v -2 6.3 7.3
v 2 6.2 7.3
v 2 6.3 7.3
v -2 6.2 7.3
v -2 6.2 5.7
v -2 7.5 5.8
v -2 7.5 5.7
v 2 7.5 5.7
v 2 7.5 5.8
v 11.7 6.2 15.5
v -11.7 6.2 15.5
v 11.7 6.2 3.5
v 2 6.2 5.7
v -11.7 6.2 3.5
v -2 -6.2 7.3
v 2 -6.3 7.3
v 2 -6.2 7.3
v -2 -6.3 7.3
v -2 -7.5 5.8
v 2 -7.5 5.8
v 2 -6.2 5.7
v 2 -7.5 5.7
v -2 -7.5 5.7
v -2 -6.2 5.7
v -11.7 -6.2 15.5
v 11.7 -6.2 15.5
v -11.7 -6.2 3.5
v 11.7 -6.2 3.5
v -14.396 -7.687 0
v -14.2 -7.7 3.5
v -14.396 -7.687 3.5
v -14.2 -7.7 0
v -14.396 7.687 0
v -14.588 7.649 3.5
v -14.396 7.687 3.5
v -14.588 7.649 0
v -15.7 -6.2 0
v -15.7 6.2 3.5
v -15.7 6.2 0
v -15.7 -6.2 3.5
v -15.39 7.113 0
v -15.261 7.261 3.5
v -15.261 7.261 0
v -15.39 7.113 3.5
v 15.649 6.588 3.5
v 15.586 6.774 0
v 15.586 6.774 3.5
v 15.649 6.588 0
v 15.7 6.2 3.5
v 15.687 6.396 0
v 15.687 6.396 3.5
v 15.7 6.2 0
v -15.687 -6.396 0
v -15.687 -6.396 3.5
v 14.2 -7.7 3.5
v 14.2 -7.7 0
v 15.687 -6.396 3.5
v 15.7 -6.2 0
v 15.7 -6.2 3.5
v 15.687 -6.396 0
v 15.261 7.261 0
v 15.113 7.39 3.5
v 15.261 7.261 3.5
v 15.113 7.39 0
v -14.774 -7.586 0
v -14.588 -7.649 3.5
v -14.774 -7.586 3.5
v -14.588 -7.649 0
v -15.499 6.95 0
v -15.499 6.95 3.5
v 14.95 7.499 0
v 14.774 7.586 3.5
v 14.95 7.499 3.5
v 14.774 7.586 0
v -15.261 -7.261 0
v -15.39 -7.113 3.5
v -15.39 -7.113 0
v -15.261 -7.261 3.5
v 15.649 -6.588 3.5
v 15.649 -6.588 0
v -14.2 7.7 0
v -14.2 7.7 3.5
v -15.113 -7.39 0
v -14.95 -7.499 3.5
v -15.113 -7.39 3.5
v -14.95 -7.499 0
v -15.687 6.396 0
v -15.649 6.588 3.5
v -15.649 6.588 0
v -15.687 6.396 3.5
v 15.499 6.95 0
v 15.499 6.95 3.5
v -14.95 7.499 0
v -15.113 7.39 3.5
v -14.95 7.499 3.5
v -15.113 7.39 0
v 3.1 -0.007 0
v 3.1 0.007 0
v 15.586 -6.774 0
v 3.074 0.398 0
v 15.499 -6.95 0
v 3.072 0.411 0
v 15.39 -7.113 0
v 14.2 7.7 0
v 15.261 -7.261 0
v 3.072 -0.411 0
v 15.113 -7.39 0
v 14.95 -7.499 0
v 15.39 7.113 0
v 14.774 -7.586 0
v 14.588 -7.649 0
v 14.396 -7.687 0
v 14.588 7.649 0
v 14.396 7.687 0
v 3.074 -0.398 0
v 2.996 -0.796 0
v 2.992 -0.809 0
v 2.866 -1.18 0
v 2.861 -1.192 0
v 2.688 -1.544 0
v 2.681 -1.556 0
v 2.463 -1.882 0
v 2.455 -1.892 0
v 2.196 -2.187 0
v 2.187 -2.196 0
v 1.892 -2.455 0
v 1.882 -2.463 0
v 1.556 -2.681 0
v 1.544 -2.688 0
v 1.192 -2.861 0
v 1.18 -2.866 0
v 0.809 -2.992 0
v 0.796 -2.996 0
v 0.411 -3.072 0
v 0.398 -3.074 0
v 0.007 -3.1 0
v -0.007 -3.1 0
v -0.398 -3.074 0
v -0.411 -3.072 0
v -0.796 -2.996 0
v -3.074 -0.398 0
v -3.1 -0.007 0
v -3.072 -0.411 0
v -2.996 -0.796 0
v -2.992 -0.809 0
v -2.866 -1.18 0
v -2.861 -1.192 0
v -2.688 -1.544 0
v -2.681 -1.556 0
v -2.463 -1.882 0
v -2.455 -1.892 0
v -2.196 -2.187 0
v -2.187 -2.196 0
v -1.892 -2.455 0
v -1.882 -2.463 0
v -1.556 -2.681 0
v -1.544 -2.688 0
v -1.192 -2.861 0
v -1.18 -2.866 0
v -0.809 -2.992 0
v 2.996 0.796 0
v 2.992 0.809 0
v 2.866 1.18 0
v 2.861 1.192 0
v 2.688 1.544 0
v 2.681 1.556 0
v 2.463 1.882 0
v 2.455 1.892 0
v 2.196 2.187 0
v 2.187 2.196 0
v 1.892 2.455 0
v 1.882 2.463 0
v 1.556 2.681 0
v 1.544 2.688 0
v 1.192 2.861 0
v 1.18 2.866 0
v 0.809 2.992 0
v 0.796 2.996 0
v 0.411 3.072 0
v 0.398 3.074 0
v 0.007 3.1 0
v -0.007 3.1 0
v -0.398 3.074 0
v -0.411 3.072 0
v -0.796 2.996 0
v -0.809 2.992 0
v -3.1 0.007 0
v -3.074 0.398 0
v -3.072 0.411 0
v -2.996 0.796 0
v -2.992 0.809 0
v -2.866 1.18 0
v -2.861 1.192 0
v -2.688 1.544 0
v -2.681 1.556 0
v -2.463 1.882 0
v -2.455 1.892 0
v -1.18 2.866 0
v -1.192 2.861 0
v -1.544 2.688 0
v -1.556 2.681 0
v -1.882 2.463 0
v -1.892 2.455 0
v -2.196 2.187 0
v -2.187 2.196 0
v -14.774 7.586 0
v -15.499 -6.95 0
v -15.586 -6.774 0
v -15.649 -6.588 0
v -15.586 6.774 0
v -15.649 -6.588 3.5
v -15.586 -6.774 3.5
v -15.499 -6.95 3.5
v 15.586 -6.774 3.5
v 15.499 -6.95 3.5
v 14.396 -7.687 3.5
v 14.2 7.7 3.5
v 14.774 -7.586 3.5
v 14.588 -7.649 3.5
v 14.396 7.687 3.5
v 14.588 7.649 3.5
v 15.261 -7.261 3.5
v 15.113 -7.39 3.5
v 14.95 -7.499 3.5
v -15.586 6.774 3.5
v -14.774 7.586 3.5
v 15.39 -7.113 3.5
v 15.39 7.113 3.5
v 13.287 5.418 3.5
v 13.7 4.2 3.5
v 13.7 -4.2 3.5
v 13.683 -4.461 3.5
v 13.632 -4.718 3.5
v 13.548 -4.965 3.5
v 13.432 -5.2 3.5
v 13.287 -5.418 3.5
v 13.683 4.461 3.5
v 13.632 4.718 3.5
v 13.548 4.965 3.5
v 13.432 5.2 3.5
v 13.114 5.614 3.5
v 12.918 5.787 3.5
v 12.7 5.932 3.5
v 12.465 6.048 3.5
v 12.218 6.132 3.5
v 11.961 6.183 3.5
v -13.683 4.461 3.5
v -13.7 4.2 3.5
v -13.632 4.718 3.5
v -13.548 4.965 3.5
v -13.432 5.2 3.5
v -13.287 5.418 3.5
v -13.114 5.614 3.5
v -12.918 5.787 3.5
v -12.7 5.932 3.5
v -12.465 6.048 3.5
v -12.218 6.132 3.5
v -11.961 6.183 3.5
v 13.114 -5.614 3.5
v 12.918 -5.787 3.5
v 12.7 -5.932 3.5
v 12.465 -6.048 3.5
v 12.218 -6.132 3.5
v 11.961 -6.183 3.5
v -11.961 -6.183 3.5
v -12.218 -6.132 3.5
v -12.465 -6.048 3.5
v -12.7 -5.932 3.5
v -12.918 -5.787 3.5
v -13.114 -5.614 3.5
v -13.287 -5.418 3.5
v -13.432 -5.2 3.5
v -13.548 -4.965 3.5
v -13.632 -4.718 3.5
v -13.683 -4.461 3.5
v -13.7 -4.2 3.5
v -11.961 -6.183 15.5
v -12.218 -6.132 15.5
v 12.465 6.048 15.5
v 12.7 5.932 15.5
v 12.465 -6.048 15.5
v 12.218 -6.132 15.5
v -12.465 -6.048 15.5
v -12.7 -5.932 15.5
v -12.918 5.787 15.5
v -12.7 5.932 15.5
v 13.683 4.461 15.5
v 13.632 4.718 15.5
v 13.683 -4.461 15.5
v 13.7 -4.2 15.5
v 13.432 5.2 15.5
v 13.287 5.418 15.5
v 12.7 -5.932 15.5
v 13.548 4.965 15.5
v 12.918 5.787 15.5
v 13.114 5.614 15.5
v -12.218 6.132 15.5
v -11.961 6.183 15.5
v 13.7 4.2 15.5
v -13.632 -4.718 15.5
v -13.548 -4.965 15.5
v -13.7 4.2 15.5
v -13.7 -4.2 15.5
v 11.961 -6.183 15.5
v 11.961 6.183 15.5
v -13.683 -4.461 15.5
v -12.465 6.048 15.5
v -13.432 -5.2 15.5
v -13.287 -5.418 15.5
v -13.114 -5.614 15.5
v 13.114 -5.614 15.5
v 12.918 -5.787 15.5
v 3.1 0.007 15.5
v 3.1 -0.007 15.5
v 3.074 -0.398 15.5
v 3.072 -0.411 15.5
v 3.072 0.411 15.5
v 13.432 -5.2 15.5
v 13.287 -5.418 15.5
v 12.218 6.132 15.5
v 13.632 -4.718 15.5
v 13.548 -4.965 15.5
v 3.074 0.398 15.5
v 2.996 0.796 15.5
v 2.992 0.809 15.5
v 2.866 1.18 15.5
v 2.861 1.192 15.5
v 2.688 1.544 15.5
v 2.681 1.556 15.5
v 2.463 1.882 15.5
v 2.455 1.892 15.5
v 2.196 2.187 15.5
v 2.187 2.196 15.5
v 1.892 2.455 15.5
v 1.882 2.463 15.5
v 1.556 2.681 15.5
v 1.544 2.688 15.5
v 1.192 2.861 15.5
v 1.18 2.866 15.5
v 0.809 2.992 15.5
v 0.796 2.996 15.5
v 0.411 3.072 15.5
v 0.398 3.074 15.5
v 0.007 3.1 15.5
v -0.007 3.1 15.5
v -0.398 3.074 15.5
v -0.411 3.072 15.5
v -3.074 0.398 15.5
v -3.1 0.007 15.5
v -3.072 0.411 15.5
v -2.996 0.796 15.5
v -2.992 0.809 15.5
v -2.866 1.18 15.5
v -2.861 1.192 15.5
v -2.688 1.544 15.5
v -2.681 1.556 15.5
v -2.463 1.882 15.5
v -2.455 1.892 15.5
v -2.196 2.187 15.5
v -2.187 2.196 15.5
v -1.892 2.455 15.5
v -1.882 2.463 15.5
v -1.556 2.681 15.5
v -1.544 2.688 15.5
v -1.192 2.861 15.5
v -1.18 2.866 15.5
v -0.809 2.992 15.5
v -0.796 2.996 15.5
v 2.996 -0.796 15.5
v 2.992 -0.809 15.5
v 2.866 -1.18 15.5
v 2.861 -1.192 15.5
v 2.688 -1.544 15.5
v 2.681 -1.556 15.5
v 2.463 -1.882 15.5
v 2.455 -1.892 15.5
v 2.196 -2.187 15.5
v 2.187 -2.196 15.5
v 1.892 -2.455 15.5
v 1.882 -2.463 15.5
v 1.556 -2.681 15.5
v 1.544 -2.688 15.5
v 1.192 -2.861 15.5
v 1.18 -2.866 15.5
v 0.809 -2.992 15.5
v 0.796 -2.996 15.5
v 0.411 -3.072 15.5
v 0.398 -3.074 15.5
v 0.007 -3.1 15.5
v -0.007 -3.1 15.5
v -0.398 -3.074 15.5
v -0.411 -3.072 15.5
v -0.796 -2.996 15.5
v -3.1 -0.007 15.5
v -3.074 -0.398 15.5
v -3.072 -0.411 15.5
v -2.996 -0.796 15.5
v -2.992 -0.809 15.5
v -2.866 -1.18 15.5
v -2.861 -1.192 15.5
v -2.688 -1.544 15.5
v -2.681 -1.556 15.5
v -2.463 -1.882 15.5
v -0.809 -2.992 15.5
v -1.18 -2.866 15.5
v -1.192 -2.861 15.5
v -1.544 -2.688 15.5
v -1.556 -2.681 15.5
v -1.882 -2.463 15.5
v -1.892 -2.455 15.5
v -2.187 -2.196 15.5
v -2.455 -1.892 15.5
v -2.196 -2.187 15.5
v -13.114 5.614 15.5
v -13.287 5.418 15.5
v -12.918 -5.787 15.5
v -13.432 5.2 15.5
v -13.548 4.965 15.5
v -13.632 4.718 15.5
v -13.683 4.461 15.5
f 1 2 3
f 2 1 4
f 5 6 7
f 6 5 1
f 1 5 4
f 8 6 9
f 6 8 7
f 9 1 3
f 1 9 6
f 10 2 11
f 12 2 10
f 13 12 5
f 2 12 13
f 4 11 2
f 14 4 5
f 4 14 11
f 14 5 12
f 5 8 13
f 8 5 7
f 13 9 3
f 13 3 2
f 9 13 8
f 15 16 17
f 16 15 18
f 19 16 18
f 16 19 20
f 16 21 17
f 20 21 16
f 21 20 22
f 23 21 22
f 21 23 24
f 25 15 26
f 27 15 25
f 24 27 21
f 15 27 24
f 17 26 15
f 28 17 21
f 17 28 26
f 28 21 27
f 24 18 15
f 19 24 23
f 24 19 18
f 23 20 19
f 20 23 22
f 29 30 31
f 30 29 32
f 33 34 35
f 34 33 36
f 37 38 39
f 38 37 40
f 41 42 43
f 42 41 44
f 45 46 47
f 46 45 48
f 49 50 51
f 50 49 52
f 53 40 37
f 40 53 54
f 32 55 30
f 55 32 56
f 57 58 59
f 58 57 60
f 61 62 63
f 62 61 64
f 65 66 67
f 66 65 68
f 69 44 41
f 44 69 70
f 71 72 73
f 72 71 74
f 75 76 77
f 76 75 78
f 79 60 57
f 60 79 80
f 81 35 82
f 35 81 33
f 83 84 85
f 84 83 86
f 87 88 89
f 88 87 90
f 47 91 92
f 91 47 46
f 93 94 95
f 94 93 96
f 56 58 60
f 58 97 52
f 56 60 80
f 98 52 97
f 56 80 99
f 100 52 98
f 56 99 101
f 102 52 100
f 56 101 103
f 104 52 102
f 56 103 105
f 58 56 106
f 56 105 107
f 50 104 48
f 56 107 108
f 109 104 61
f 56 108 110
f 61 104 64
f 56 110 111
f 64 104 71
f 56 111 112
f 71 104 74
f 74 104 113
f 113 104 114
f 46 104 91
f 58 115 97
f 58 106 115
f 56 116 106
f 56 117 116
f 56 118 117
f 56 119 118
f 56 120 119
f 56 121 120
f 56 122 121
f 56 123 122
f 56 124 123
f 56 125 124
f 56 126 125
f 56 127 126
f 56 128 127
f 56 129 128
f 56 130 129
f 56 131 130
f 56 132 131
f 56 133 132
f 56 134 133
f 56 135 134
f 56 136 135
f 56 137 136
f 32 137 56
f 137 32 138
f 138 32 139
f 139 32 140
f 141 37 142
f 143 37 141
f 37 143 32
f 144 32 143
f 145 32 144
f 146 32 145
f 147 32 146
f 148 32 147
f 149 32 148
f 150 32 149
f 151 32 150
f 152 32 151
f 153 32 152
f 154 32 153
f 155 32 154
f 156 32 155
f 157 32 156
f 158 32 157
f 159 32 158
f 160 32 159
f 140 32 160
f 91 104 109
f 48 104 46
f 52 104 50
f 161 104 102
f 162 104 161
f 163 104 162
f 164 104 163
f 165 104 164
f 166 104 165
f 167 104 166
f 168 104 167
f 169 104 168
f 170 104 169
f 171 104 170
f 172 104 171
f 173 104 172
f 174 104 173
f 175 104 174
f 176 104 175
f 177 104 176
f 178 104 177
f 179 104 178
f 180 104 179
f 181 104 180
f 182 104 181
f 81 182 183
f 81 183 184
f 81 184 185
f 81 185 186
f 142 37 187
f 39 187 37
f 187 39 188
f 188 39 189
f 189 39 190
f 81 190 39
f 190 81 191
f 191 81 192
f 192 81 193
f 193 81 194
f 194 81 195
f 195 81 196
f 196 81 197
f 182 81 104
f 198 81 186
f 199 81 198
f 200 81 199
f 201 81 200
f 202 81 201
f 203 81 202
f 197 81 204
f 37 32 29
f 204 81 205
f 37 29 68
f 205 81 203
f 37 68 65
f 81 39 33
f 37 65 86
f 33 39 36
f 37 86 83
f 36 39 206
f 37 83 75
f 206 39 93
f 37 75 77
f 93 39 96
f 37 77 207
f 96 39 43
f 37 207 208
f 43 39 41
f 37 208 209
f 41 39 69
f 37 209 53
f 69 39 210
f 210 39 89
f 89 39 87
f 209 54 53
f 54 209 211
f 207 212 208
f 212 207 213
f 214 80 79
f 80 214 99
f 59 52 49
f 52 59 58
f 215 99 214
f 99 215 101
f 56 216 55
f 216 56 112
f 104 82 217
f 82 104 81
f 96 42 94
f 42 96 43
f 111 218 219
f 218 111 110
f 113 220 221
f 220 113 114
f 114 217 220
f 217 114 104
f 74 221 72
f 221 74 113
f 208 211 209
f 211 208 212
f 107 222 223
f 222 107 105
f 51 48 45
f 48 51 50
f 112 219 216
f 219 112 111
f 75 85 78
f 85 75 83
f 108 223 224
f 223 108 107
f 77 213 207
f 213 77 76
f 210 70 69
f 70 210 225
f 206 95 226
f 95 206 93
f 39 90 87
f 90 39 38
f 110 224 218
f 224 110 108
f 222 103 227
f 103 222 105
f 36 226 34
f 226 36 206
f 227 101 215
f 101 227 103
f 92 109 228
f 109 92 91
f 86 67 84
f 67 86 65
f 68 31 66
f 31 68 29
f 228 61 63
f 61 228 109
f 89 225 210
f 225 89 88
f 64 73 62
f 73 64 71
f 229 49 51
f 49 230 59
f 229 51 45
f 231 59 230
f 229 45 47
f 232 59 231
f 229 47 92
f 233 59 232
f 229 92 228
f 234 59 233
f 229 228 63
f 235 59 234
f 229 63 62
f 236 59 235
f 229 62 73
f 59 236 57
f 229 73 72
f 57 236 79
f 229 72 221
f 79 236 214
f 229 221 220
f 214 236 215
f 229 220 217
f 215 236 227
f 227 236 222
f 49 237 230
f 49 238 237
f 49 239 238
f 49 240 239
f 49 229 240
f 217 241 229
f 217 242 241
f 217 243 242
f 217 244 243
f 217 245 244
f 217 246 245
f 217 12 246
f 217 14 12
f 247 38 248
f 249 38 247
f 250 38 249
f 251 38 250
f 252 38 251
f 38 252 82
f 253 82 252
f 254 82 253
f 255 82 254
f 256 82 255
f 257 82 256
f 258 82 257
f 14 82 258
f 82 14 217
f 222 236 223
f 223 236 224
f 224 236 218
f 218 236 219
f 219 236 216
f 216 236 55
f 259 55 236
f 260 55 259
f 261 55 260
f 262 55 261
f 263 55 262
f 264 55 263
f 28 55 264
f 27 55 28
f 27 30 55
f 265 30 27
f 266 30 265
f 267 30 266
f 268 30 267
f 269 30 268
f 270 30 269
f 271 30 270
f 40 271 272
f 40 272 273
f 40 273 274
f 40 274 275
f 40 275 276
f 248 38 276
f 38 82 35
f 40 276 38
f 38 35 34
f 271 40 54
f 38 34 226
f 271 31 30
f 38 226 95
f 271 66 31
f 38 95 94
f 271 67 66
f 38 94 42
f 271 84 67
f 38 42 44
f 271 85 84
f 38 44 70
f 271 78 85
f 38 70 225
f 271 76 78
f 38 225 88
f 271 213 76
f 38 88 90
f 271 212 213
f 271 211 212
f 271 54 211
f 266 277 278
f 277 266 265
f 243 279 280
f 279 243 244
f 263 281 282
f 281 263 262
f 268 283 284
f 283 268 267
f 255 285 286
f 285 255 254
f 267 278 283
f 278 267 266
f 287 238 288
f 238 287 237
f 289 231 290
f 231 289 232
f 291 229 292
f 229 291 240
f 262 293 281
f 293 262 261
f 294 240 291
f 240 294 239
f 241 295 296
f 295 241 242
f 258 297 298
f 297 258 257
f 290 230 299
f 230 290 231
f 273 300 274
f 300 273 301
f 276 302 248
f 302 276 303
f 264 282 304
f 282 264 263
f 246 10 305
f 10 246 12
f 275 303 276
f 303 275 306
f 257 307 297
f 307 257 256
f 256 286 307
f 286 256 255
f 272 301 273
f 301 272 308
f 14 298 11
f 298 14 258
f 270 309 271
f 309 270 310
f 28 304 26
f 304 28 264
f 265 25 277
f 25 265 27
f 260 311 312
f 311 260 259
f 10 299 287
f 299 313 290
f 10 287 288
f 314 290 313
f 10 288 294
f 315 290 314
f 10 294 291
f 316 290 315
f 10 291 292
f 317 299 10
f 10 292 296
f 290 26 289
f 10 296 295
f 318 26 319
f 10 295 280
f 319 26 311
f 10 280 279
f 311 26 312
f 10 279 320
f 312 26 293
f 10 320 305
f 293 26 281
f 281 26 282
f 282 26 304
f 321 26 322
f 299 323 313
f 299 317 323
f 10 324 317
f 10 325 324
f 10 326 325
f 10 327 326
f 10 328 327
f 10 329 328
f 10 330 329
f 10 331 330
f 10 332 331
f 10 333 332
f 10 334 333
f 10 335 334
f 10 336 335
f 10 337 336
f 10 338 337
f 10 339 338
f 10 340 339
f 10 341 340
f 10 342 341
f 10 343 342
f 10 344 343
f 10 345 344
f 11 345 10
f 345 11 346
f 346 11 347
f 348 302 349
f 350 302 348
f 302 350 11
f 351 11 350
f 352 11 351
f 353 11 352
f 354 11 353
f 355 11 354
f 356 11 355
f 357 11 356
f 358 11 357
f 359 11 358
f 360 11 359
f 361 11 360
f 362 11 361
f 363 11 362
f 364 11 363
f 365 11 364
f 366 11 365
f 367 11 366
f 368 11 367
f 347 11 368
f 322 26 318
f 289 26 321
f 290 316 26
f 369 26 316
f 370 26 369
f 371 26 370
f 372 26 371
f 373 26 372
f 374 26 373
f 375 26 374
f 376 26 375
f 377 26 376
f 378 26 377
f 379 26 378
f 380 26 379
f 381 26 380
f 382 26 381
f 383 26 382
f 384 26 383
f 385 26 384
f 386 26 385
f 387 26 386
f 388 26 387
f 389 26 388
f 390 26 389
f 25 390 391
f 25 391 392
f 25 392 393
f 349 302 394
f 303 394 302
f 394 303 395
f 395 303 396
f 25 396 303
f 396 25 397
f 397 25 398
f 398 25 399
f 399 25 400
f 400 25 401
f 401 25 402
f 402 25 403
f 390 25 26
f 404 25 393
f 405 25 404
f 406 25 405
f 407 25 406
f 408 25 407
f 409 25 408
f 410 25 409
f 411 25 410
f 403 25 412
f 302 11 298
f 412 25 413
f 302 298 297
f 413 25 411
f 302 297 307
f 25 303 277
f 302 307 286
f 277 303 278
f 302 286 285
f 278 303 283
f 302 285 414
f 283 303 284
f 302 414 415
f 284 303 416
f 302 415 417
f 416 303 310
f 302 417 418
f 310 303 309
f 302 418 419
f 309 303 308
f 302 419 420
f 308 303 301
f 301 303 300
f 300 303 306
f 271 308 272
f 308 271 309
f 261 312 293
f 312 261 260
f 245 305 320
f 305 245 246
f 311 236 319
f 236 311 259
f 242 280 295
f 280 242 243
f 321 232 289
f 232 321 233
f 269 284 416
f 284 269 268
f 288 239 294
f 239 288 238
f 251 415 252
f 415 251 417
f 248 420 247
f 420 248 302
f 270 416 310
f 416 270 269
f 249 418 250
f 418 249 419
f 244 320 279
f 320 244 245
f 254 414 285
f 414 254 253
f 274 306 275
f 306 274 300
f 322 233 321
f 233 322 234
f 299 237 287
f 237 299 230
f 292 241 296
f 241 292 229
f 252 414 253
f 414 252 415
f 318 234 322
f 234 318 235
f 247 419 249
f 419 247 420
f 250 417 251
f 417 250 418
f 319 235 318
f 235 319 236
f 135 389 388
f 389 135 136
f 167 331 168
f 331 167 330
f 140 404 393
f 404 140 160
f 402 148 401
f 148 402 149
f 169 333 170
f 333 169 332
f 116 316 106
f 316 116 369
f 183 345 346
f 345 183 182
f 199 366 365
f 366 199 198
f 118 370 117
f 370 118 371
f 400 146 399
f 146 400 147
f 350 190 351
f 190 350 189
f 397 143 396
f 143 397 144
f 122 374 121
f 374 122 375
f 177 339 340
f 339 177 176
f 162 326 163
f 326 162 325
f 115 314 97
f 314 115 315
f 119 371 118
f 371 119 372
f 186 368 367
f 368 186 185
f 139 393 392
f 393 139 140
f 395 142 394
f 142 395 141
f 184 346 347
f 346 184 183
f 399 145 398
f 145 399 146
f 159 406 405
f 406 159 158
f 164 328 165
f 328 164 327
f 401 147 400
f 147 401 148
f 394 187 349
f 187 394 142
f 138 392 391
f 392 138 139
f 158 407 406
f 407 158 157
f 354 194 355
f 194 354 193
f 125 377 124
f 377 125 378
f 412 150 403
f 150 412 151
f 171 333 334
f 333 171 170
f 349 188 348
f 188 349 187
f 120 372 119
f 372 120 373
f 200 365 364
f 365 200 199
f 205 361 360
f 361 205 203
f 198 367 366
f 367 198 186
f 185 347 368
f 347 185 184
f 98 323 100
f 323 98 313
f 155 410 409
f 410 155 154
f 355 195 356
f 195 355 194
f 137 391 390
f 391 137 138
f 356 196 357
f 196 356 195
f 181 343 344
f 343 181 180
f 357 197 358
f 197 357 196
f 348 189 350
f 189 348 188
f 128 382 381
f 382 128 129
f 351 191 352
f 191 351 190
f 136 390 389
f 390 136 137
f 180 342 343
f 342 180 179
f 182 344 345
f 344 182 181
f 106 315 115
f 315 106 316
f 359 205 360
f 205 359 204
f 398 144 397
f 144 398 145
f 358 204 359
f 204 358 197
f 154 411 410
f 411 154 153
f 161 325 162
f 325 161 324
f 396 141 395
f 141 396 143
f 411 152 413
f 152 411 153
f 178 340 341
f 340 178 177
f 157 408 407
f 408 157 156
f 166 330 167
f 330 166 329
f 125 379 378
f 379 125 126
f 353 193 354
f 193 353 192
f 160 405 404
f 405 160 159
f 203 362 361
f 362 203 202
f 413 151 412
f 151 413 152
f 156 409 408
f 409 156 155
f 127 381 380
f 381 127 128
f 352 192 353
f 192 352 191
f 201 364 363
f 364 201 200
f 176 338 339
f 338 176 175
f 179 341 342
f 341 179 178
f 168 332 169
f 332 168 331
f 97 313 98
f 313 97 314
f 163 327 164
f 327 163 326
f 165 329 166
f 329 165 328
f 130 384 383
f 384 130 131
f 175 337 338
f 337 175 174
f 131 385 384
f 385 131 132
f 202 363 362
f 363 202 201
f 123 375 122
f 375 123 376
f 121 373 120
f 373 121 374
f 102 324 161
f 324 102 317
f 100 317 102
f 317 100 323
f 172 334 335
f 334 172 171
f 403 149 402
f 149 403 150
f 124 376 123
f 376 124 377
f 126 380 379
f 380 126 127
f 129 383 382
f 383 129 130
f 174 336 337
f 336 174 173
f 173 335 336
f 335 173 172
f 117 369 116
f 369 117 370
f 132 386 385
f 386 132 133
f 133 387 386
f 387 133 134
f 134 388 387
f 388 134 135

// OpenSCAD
// file: parameters.scad
// ============================================
// MODULAR CABLE ORGANIZER - SHARED PARAMETERS
// ============================================
// All dimensions in mm - include this in all files
// ============================================

$fn = 48;

// === TOLERANCES ===
clearance = 0.3;
port_clearance = 0.1;  // Extra clearance for port openings (reduced - 0.2 was too loose for USB-C)
wall = 1.6;

// === SLOT DIMENSIONS (2:1 aspect ratio) - scaled to 2/3 ===
slot_width = 32;  // Reduced by 1mm for more compact insert
slot_height = 16;  // Reduced by 1mm for more compact insert
slot_depth = 4;  // Reduced from 6mm - less frame depth needed

// === FRAME STRUCTURE ===
frame_wall = 0.5;   // Reduced for more compact frame
frame_border = 8;  // Increased by 10mm for mounting holes with countersink
frame_back = 2;     // Slightly thicker for snap catch strength
mount_hole_dia = 3;
countersink_dia = 6;  // Diameter of countersink for screw heads
countersink_depth = 2;  // Depth of countersink

// === GRID ===
grid_cols = 2;
grid_rows = 2;

// === INSERT BASE DIMENSIONS ===
insert_width = slot_width - (2 * clearance);
insert_height = slot_height - (2 * clearance);
insert_base_depth = slot_depth - 0.5;

// === INSERT BODY (protrudes from frame) ===
insert_body_width = insert_width - 4;
insert_body_height = insert_height - 3;
insert_body_depth = 12;  // Deep enough to accommodate male cable connectors
insert_top_thick = 1.5;  // Top platform thickness

// === SNAP TABS (on neck/body - catch on back plate) ===
snap_tab_width = 4;
snap_tab_protrude = 1.2;  // How far tab sticks out from body
snap_tab_thick = 1.5;     // Z thickness of tab
snap_tab_offset = 2.2;      // Distance from base to tab bottom on insert (increased to clear frame)

// === CONNECTOR PORT DIMENSIONS & BODY DEPTHS ===
// Port dimensions from reference blueprints
// Body depths sized to match typical male connector lengths

// USB-C: 8.4 x 2.6mm, male connector ~9mm
usbc_w = 8.4;
usbc_h = 2.6;
usbc_r = 1.0;
usbc_body_depth = 9;

// USB-A: 14.0 x 6.5mm, male connector ~13mm
usba_w = 14.0;
usba_h = 6.5;
usba_r = 0.5;
usba_body_depth = 13;

// USB Mini: 6.9 x 3.0mm, male connector ~9mm
usb_mini_w = 6.9;
usb_mini_h = 3.0;
usb_mini_r = 0.5;
usb_mini_body_depth = 9;

// USB Micro: 6.9 x 1.8mm, male connector ~7mm
usb_micro_w = 6.9;
usb_micro_h = 1.8;
usb_micro_r = 0.3;
usb_micro_body_depth = 7;

// USB-B: 8.0 x 7.5mm, male connector ~14mm
usb_b_w = 8.0;
usb_b_h = 7.5;
usb_b_r = 1.0;
usb_b_body_depth = 14;

// Lightning: 6.7 x 1.5mm, male connector ~8mm
lightning_w = 6.7;
lightning_h = 1.5;
lightning_r = 0.5;
lightning_body_depth = 8;

// HDMI: 14.0 x 4.5mm, male connector ~16mm
hdmi_w = 14.0;
hdmi_h = 4.5;
hdmi_r = 0.5;
hdmi_body_depth = 16;

// 3.5mm Audio Jack: male plug ~14mm
audio_jack_dia = 6.0;
audio_jack_body_depth = 14;

// Blank/Label: recessed area for label
label_w = 30;
label_h = 12;
label_depth = 0.8;

// === CALCULATED VALUES ===
frame_total_depth = frame_back + slot_depth;
grid_width = (grid_cols * slot_width) + ((grid_cols - 1) * frame_wall);
grid_height = (grid_rows * slot_height) + ((grid_rows - 1) * frame_wall);
frame_width = grid_width + (2 * frame_border);
frame_height_total = grid_height + (2 * frame_border);
insert_total_depth = insert_base_depth + insert_body_depth;
// file: insert_base.scad
// ============================================
// MODULAR CABLE ORGANIZER - BASE INSERT MODULE
// ============================================
// This is the parent module for all insert types
// Include this file and call insert_with_port() with a port shape
// ============================================

include <parameters.scad>

// === BASE INSERT WITH CUSTOM BODY DEPTH ===
module insert_blank_custom(body_depth) {
    union() {
        // Base plate (sits in frame slot)
        rounded_box_rect(insert_width, insert_height, insert_base_depth, 1.5);
        
        // Body (protrudes out front) - custom depth
        translate([0, 0, insert_base_depth])
            rounded_box_rect(insert_body_width, insert_body_height, body_depth, 2);
        
        // Snap tabs on all 4 sides
        snap_tabs_all();
    }
}

// === BASE INSERT (default depth - for backwards compatibility) ===
module insert_blank() {
    insert_blank_custom(insert_body_depth);
}

// === INSERT WITH THROUGH-HOLE PORT (custom depth) ===
// Pass body_depth and a 2D shape as children
module insert_with_port_custom(body_depth) {
    total_depth = insert_base_depth + body_depth;
    difference() {
        insert_blank_custom(body_depth);
        
        // Cut port hole ALL THE WAY through (tube shape)
        translate([0, 0, -0.1])
            linear_extrude(total_depth + 0.2)
            offset(r=port_clearance)  // Add clearance to port opening
            children();
    }
}

// === INSERT WITH THROUGH-HOLE PORT (default depth) ===
module insert_with_port() {
    insert_with_port_custom(insert_body_depth) children();
}

// === PRE-MADE INSERT MODULES WITH CORRECT DEPTHS ===
module insert_usbc() {
    insert_with_port_custom(usbc_body_depth) port_usbc();
}

module insert_usba() {
    insert_with_port_custom(usba_body_depth) port_usba();
}

module insert_usb_mini() {
    insert_with_port_custom(usb_mini_body_depth) port_usb_mini();
}

module insert_usb_micro() {
    insert_with_port_custom(usb_micro_body_depth) port_usb_micro();
}

module insert_usb_b() {
    insert_with_port_custom(usb_b_body_depth) port_usb_b();
}

module insert_lightning() {
    insert_with_port_custom(lightning_body_depth) port_lightning();
}

module insert_hdmi() {
    insert_with_port_custom(hdmi_body_depth) port_hdmi();
}

module insert_audio_jack() {
    insert_with_port_custom(audio_jack_body_depth) port_audio_jack();
}

// === SNAP TABS (on neck/body - catch on frame cutouts) ===
// Tabs are on the body, positioned to engage with frame wall cutouts
module snap_tabs_all() {
    // Position tabs up on body (clear of base/frame)
    tab_z = insert_base_depth + snap_tab_offset;
    
    // Tabs on all 4 sides of the body
    for (angle = [0, 90, 180, 270]) {
        rotate([0, 0, angle])
            translate([0, insert_body_height/2, tab_z])
            neck_snap_tab();
    }
}

module neck_snap_tab() {
    // Wedge shape (FLIPPED): 
    // - Peak/taper on BOTTOM - slides past back plate when inserting
    // - Flat on TOP - catches and holds
    hull() {
        // Peak of wedge (protruding, at BOTTOM of tab)
        translate([-snap_tab_width/2, snap_tab_protrude, 0])
            cube([snap_tab_width, 0.1, 0.1]);
        // Flat top (at body surface, TOP of tab)
        translate([-snap_tab_width/2, 0, snap_tab_thick])
            cube([snap_tab_width, 0.1, 0.1]);
        // Base of wedge (at body surface, bottom)
        translate([-snap_tab_width/2, 0, 0])
            cube([snap_tab_width, 0.1, 0.1]);
    }
}

module snap_tab_horizontal() {
    hull() {
        translate([0, -snap_tab_protrude/2, 0])
            cube([snap_tab_width, 0.1, snap_tab_thick], center=true);
        translate([0, snap_tab_protrude/2, snap_tab_thick * 0.2])
            cube([snap_tab_width, 0.1, snap_tab_thick * 0.6], center=true);
    }
}

module snap_tab_vertical() {
    hull() {
        translate([-snap_tab_protrude/2, 0, 0])
            cube([0.1, snap_tab_width, snap_tab_thick], center=true);
        translate([snap_tab_protrude/2, 0, snap_tab_thick * 0.2])
            cube([0.1, snap_tab_width, snap_tab_thick * 0.6], center=true);
    }
}

// === UTILITY MODULES ===
module rounded_box_rect(w, d, h, r) {
    translate([0, 0, h/2])
        hull() {
            for (x = [-1, 1], y = [-1, 1])
                translate([x * (w/2 - r), y * (d/2 - r), 0])
                    cylinder(h=h, r=r, center=true);
        }
}

// === PORT SHAPE MODULES (2D) ===
// These define the cutout shapes for each connector type

module port_rounded_rect(w, h, r) {
    // Standard rounded rectangle
    hull() {
        for (x = [-1, 1], y = [-1, 1])
            translate([x * (w/2 - r), y * (h/2 - r)])
                circle(r=r);
    }
}

module port_usbc() {
    port_rounded_rect(usbc_w, usbc_h, usbc_r);
}

module port_usba() {
    port_rounded_rect(usba_w, usba_h, usba_r);
}

module port_usb_mini() {
    port_rounded_rect(usb_mini_w, usb_mini_h, usb_mini_r);
}

module port_usb_micro() {
    port_rounded_rect(usb_micro_w, usb_micro_h, usb_micro_r);
}

module port_usb_b() {
    // USB-B has beveled top corners
    hull() {
        // Bottom corners (full radius)
        for (x = [-1, 1])
            translate([x * (usb_b_w/2 - usb_b_r), -(usb_b_h/2 - usb_b_r)])
                circle(r=usb_b_r);
        // Top corners (chamfered - moved inward)
        for (x = [-1, 1])
            translate([x * (usb_b_w/2 - usb_b_r - 1), (usb_b_h/2 - usb_b_r)])
                circle(r=usb_b_r);
    }
}

module port_lightning() {
    port_rounded_rect(lightning_w, lightning_h, lightning_r);
}

module port_hdmi() {
    // HDMI is tapered (wider at top)
    hull() {
        // Top (wider)
        for (x = [-1, 1])
            translate([x * (hdmi_w/2 - hdmi_r), (hdmi_h/2 - hdmi_r)])
                circle(r=hdmi_r);
        // Bottom (narrower)
        for (x = [-1, 1])
            translate([x * (hdmi_w/2 - hdmi_r - 1), -(hdmi_h/2 - hdmi_r)])
                circle(r=hdmi_r);
    }
}

module port_audio_jack() {
    circle(d=audio_jack_dia);
}

module port_label_recess() {
    // Shallow rectangular recess for labels
    square([label_w, label_h], center=true);
}

// === RENDER (for testing this file directly) ===
// insert_blank();
// main file
// ============================================
// 3.5MM AUDIO JACK FEMALE INSERT
// Port: Ø6.0mm circular
// ============================================

include <insert_base.scad>

module insert_audio_jack() {
    insert_with_port() port_audio_jack();
}

// Render
insert_audio_jack();
